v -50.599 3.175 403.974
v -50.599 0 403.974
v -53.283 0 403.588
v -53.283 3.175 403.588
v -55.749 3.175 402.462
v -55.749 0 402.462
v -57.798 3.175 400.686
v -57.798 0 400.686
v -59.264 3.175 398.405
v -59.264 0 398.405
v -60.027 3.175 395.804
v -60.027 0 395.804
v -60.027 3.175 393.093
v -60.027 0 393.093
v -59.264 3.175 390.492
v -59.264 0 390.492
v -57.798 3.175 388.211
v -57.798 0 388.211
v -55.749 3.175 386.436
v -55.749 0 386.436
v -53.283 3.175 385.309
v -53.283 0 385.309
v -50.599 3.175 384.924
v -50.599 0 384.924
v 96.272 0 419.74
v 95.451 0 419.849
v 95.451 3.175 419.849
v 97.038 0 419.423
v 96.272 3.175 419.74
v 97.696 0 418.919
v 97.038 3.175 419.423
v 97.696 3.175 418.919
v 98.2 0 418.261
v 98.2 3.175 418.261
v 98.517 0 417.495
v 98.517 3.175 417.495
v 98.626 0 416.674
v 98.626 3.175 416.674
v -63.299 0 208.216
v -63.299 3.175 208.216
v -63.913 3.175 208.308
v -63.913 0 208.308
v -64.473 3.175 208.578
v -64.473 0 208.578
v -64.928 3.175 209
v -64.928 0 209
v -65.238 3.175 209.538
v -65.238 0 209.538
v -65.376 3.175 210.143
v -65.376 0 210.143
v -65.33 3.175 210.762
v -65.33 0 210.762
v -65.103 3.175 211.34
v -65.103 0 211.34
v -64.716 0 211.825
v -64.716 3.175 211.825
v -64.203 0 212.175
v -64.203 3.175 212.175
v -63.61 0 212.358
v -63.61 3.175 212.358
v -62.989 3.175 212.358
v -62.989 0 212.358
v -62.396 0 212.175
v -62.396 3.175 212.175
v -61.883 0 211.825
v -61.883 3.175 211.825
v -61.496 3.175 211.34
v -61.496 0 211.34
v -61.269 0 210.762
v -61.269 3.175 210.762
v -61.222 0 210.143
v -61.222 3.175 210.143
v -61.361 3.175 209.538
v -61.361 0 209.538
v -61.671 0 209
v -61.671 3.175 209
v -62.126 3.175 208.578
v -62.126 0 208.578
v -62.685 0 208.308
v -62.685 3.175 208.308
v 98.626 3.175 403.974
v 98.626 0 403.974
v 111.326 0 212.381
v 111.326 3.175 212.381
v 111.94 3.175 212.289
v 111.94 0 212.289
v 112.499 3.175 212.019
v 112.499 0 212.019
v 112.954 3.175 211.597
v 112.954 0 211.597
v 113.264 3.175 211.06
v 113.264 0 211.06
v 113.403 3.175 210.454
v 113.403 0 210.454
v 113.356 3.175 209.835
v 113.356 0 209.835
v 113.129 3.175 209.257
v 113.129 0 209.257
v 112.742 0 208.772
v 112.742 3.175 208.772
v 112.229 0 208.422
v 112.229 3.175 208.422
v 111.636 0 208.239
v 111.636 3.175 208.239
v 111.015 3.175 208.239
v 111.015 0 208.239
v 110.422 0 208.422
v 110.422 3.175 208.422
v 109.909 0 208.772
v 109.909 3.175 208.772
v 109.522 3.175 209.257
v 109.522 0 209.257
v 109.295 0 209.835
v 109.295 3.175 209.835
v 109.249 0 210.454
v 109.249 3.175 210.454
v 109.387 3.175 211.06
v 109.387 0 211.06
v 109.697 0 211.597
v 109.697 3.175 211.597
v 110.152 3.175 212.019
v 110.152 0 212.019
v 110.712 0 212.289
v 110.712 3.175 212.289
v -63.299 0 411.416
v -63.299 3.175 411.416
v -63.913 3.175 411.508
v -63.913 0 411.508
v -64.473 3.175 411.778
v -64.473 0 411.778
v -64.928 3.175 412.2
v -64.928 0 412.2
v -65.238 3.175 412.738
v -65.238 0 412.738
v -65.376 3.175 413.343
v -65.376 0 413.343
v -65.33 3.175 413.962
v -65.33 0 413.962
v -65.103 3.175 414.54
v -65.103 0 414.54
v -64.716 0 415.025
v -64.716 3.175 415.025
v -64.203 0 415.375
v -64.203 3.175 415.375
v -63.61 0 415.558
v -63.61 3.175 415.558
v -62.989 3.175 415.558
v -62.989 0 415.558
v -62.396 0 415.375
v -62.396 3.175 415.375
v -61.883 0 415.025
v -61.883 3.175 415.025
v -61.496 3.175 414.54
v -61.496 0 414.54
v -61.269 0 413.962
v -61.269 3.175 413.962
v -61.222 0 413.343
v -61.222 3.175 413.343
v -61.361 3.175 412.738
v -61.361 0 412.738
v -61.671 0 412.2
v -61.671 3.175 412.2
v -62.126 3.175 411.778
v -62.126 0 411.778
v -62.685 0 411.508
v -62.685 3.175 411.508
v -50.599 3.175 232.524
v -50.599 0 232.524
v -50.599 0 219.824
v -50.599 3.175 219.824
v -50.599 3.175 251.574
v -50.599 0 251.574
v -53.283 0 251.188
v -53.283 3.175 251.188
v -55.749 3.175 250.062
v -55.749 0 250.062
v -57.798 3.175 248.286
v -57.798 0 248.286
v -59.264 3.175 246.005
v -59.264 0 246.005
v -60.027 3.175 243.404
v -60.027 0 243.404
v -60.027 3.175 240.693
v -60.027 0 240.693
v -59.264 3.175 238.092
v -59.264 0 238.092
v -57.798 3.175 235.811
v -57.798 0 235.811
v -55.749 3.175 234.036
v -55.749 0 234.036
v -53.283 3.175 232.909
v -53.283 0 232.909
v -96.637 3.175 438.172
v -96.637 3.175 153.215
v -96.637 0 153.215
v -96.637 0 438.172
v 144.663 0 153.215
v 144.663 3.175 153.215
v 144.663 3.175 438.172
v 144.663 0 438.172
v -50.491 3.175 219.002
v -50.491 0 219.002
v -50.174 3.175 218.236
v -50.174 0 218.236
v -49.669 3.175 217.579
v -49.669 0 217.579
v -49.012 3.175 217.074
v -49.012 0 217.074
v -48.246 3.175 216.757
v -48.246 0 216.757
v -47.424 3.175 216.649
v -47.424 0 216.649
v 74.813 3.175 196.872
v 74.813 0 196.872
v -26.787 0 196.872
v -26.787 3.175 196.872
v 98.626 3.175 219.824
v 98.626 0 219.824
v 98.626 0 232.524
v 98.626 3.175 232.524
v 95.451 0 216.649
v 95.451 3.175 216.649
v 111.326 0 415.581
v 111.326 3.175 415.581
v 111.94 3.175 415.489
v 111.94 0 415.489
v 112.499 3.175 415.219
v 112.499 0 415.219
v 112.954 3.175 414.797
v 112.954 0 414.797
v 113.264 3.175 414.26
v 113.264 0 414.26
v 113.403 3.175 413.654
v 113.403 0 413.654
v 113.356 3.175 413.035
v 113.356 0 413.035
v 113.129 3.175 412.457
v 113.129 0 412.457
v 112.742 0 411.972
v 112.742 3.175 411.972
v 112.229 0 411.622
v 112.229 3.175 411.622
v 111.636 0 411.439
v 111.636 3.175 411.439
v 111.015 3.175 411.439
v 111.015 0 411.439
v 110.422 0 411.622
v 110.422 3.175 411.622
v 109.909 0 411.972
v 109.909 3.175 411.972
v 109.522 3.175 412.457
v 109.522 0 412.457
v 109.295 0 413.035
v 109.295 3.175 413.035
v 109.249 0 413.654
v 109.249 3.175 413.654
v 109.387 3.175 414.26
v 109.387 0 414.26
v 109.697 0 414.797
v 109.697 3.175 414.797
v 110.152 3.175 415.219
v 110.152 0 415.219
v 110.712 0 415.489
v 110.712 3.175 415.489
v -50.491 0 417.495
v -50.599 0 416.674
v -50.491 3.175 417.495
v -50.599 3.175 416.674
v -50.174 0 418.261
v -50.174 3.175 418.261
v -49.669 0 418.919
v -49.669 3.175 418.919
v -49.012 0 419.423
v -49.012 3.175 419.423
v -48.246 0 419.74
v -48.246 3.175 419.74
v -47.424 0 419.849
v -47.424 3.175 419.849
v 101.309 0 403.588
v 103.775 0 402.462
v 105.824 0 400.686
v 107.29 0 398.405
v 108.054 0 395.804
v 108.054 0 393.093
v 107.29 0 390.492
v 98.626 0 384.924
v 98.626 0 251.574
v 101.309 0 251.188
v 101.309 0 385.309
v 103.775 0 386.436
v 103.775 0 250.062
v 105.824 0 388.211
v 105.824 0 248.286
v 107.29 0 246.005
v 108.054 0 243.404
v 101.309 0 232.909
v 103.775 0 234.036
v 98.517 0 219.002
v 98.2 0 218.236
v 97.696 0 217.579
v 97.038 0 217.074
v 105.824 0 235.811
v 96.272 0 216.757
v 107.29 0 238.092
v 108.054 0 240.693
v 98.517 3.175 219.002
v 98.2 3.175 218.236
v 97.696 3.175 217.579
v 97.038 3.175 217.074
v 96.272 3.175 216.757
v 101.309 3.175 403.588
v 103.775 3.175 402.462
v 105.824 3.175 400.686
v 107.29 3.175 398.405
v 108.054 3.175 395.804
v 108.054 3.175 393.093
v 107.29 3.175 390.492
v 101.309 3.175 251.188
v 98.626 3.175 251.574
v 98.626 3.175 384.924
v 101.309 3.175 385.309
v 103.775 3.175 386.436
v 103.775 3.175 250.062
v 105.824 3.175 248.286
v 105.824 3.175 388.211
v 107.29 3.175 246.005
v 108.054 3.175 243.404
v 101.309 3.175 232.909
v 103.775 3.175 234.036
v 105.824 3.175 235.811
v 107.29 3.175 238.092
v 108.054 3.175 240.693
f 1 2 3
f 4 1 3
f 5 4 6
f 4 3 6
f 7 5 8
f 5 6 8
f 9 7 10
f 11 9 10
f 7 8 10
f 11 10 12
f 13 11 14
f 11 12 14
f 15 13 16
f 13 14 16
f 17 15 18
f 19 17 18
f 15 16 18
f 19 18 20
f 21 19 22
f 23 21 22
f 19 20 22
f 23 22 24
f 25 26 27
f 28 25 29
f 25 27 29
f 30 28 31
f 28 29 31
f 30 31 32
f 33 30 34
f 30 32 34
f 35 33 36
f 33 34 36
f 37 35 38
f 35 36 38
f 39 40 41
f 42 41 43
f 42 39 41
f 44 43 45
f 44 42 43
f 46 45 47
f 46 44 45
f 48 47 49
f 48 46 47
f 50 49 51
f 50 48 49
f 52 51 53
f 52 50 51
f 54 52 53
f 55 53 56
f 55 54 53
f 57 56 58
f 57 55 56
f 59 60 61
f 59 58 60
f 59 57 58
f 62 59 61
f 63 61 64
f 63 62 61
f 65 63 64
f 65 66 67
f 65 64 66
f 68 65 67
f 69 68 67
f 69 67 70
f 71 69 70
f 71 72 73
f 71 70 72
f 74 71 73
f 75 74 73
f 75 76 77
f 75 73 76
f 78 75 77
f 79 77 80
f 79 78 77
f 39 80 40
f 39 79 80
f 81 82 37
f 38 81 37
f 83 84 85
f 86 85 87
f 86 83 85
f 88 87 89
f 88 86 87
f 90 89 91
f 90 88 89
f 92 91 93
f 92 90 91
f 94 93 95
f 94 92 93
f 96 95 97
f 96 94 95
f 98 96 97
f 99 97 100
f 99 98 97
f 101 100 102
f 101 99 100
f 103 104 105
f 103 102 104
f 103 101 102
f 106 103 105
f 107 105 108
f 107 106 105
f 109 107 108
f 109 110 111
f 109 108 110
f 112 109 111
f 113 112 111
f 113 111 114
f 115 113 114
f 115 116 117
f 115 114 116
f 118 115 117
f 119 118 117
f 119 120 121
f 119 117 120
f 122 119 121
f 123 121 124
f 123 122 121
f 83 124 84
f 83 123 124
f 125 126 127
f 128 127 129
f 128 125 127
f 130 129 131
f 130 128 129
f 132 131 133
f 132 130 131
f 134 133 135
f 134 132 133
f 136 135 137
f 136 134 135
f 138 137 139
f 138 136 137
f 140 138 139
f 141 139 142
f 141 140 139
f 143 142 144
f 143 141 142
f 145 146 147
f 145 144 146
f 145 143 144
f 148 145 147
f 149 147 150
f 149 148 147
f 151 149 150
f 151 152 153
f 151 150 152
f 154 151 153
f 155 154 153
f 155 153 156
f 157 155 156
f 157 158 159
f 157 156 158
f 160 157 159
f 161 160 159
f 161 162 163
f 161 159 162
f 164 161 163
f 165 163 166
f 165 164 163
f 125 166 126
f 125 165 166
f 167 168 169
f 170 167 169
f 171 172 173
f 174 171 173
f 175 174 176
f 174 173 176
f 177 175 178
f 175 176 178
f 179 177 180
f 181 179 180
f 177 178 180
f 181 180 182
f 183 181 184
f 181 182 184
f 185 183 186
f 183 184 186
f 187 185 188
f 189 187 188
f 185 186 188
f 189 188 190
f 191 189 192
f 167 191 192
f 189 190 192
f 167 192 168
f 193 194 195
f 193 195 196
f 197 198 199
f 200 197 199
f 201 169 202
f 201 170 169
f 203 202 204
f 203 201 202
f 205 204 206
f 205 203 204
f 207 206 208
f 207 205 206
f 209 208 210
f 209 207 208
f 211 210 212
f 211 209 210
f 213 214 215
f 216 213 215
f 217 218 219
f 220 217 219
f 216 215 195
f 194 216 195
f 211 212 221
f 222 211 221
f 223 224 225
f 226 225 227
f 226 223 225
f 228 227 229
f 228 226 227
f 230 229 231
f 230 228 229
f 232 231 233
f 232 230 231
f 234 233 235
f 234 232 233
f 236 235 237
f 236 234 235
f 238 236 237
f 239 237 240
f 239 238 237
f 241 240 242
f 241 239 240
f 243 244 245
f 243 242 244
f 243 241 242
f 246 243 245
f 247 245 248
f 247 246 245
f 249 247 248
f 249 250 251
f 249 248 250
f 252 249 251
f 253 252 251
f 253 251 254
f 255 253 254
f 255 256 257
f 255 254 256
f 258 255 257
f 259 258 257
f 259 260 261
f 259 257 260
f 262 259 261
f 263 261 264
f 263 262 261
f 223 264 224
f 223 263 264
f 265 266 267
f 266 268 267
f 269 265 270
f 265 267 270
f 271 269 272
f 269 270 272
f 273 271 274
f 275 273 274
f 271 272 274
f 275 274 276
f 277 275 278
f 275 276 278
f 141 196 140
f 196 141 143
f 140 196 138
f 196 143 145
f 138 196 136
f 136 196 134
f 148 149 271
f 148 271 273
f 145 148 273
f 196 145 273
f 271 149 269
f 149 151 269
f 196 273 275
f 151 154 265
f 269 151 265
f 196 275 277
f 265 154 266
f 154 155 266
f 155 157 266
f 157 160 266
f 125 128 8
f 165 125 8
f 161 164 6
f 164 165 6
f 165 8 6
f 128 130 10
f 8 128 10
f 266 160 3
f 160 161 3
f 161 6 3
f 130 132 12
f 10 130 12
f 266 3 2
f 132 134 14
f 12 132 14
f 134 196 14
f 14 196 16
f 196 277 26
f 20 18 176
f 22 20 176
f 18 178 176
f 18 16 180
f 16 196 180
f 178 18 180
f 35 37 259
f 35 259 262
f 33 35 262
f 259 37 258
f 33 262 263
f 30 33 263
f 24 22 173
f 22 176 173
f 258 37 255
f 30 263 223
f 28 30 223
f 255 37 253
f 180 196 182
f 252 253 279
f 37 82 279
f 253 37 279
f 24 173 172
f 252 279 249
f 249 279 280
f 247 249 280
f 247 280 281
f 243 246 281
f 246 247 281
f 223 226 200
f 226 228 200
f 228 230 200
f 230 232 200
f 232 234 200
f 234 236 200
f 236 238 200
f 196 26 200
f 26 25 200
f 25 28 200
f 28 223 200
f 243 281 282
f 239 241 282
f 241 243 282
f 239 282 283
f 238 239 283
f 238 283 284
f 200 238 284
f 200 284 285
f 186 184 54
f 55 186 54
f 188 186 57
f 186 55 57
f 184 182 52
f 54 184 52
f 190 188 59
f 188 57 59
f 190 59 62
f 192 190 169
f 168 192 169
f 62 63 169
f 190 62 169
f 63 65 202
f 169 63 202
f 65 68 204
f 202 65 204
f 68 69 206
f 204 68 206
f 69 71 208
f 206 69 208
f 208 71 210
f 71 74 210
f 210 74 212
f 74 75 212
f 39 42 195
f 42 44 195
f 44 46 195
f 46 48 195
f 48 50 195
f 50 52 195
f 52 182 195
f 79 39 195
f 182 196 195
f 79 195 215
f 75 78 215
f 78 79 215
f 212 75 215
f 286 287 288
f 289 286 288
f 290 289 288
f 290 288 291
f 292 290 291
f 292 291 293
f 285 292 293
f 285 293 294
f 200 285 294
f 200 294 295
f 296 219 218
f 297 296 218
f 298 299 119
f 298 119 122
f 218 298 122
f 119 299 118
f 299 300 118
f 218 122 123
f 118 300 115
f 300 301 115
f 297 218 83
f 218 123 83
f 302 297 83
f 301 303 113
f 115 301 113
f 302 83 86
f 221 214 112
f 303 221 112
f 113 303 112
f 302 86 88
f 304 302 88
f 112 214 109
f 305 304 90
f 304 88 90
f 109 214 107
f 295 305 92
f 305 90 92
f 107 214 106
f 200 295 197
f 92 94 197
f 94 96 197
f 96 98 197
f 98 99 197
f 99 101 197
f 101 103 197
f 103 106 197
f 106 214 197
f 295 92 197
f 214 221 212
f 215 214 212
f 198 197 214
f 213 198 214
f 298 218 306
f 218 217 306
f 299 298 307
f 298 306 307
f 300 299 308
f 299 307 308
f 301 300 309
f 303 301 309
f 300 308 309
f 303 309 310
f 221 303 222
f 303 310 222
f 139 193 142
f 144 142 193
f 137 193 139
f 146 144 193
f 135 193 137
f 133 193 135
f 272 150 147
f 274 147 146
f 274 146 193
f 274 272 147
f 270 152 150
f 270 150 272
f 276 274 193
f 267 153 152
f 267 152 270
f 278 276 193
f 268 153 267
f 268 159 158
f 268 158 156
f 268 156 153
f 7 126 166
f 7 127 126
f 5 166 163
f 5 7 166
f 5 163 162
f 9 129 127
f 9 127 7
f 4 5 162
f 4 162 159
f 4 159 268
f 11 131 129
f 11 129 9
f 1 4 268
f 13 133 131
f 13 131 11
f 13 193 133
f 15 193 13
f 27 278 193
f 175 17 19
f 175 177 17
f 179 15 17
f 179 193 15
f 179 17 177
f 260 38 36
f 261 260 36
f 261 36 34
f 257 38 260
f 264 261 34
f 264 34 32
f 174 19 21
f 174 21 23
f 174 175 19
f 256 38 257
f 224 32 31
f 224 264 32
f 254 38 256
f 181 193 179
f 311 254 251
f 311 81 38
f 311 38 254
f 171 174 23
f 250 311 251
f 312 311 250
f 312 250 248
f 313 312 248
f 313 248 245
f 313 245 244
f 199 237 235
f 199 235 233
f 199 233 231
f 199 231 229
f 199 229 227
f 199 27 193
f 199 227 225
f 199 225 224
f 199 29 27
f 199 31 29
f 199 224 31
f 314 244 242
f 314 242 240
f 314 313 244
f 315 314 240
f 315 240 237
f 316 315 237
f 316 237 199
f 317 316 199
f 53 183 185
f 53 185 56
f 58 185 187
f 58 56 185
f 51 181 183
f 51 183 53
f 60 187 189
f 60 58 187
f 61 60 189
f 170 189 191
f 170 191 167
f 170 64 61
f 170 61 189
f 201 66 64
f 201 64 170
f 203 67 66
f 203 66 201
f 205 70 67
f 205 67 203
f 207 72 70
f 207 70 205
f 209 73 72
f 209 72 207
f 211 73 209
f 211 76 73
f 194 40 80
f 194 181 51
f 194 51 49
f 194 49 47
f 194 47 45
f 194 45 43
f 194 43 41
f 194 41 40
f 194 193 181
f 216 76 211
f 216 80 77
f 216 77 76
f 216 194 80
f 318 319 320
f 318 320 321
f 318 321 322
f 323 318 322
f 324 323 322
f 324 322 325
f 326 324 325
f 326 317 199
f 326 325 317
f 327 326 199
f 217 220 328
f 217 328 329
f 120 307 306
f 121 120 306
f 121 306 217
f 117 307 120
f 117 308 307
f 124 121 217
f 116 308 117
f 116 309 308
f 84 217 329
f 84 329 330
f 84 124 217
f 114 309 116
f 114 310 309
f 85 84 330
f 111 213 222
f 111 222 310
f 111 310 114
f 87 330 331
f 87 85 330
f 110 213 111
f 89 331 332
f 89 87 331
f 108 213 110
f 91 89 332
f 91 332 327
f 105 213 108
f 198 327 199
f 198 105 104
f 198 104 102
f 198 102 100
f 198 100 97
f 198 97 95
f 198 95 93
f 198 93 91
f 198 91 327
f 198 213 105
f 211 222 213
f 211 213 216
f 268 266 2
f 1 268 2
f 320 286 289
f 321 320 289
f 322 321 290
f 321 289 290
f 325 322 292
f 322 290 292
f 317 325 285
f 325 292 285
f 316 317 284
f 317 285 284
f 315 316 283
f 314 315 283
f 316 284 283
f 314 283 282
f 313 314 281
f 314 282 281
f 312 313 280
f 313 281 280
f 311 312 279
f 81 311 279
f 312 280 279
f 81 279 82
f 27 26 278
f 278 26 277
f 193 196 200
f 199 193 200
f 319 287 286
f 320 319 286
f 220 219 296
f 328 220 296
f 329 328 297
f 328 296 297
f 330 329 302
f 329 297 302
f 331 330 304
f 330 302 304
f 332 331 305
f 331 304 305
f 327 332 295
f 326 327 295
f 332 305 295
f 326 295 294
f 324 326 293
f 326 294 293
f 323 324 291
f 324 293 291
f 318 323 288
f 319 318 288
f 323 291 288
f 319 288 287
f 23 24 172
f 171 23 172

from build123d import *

# Parameters (mm, degrees)
SKETCH1_W           = 63.5
SKETCH1_H           = 190.5
BOSS_EXTRUDE1_DEPTH = 3.175
SKETCH3_R           = 2.0828
CUT_EXTRUDE2_DEPTH  = 526.850378691
SKETCH4_R           = 2.0828
CUT_EXTRUDE4_DEPTH  = 526.850378691
FILLET2_R           = 3.175
CUT_EXTRUDE5_DEPTH  = 526.850378691


with BuildPart() as part:
    # Sketch1 → Boss-Extrude1 (new body)
    with BuildSketch(Plane(origin=(0, 0, 0), x_dir=(1, 0, 0), z_dir=(0, 1, 0))):
        Polygon((-242.686835374, -133.432512515), (-242.686835374, -385.491221995), (-242.686835374, -387.371651362), (-191.886835374, -438.171651362), (239.913164626, -438.171651362), (290.713164626, -387.371651362), (290.713164626, -133.371651362), (176.413164626, -82.571651362), (176.413164626, -133.371651362), (74.813164626, -196.871651362), (-26.786835374, -196.871651362), (-128.386835374, -133.371651362), (-128.386835374, -82.571651362), (-242.686835374, -133.371651362), align=None)
        with Locations((233.563164626, -243.80020948)):
            Rectangle(SKETCH1_W, SKETCH1_H, mode=Mode.SUBTRACT)
        with Locations((-185.536835374, -243.80020948)):
            Rectangle(SKETCH1_W, SKETCH1_H, mode=Mode.SUBTRACT)
    extrude(amount=BOSS_EXTRUDE1_DEPTH)

    # Sketch3 → Cut-Extrude2 (cut, through all)
    with BuildSketch(Plane(origin=(0, 0, 0), x_dir=(1, 0, 0), z_dir=(0, 1, 0))):
        with Locations(Location((-114.278235374, -270.125471314, 0), (0, 0, 270))):
            Circle(SKETCH3_R)
        with Locations(Location((-143.449035374, -284.13540948, 0), (0, 0, 270))):
            Circle(SKETCH3_R)
        with Locations(Location((-114.278235374, -217.474947647, 0), (0, 0, 270))):
            Circle(SKETCH3_R)
        with Locations(Location((-143.449035374, -203.46500948, 0), (0, 0, 270))):
            Circle(SKETCH3_R)
        with Locations(Location((191.475364626, -284.13540948, 0), (0, 0, 270))):
            Circle(SKETCH3_R)
        with Locations(Location((162.304564626, -270.125471314, 0), (0, 0, 270))):
            Circle(SKETCH3_R)
        with Locations(Location((162.304564626, -217.474947647, 0), (0, 0, 270))):
            Circle(SKETCH3_R)
        with Locations(Location((191.475364626, -203.46500948, 0), (0, 0, 270))):
            Circle(SKETCH3_R)
    extrude(amount=CUT_EXTRUDE2_DEPTH, mode=Mode.SUBTRACT)

    # Sketch4 → Cut-Extrude4 (cut, through all)
    with BuildSketch(Plane(origin=(0, 0, 0), x_dir=(1, 0, 0), z_dir=(0, 1, 0))):
        with Locations(Location((111.325664626, -210.298576853, 0), (0, 0, 270))):
            Circle(SKETCH4_R)
        with Locations(Location((111.325664626, -413.498576853, 0), (0, 0, 270))):
            Circle(SKETCH4_R)
        with Locations(Location((-63.299335374, -413.498576853, 0), (0, 0, 90))):
            Circle(SKETCH4_R)
        with Locations(Location((-63.299335374, -210.298576853, 0), (0, 0, 90))):
            Circle(SKETCH4_R)
        with BuildLine():
            Line((-50.599335374, -216.648576853), (98.625664626, -216.648576853))
            Line((98.625664626, -216.648576853), (98.625664626, -232.523576853))
            ThreePointArc((98.625664626, -232.523576853), (108.150664626, -242.048576853), (98.625664626, -251.573576853))
            Line((98.625664626, -251.573576853), (98.625664626, -384.923576853))
            ThreePointArc((98.625664626, -384.923576853), (108.150664626, -394.448576853), (98.625664626, -403.973576853))
            Line((98.625664626, -403.973576853), (98.625664626, -419.848576853))
            Line((98.625664626, -419.848576853), (-50.599335374, -419.848576853))
            Line((-50.599335374, -419.848576853), (-50.599335374, -403.973576853))
            ThreePointArc((-50.599335374, -403.973576853), (-60.124335374, -394.448576853), (-50.599335374, -384.923576853))
            Line((-50.599335374, -384.923576853), (-50.599335374, -251.573576853))
            ThreePointArc((-50.599335374, -251.573576853), (-60.124335374, -242.048576853), (-50.599335374, -232.523576853))
            Line((-50.599335374, -232.523576853), (-50.599335374, -216.648576853))
        make_face()
    extrude(amount=CUT_EXTRUDE4_DEPTH, mode=Mode.SUBTRACT)

    # Fillet2
    fillet2_edges = [part.edges().sort_by_distance(p)[0] for p in [
        (98.625664626, 1.5875, 419.848576853),
        (98.625664626, 1.5875, 216.648576853),
        (-50.599335374, 1.5875, 216.648576853),
        (-50.599335374, 1.5875, 419.848576853),
    ]]
    fillet(fillet2_edges, radius=FILLET2_R)

    # Sketch6 → Cut-Extrude5 (cut, through all)
    with BuildSketch(Plane(origin=(0, 3.175, 0), x_dir=(1, 0, 0), z_dir=(0, 1, 0))):
        Polygon((-96.636835374, -438.171651362), (-191.886835374, -438.171651362), (-242.686835374, -387.371651362), (-242.686835374, -133.371651362), (-128.386835374, -82.571651362), (-128.386835374, -133.371651362), (-96.636835374, -153.215401362), align=None)
        Polygon((176.413164626, -133.371651362), (144.663164626, -153.215401362), (144.663164626, -438.171651362), (239.913164626, -438.171651362), (290.713164626, -387.371651362), (290.713164626, -133.371651362), (176.413164626, -82.571651362), align=None)
    extrude(amount=-CUT_EXTRUDE5_DEPTH, mode=Mode.SUBTRACT)


solid = part.part
